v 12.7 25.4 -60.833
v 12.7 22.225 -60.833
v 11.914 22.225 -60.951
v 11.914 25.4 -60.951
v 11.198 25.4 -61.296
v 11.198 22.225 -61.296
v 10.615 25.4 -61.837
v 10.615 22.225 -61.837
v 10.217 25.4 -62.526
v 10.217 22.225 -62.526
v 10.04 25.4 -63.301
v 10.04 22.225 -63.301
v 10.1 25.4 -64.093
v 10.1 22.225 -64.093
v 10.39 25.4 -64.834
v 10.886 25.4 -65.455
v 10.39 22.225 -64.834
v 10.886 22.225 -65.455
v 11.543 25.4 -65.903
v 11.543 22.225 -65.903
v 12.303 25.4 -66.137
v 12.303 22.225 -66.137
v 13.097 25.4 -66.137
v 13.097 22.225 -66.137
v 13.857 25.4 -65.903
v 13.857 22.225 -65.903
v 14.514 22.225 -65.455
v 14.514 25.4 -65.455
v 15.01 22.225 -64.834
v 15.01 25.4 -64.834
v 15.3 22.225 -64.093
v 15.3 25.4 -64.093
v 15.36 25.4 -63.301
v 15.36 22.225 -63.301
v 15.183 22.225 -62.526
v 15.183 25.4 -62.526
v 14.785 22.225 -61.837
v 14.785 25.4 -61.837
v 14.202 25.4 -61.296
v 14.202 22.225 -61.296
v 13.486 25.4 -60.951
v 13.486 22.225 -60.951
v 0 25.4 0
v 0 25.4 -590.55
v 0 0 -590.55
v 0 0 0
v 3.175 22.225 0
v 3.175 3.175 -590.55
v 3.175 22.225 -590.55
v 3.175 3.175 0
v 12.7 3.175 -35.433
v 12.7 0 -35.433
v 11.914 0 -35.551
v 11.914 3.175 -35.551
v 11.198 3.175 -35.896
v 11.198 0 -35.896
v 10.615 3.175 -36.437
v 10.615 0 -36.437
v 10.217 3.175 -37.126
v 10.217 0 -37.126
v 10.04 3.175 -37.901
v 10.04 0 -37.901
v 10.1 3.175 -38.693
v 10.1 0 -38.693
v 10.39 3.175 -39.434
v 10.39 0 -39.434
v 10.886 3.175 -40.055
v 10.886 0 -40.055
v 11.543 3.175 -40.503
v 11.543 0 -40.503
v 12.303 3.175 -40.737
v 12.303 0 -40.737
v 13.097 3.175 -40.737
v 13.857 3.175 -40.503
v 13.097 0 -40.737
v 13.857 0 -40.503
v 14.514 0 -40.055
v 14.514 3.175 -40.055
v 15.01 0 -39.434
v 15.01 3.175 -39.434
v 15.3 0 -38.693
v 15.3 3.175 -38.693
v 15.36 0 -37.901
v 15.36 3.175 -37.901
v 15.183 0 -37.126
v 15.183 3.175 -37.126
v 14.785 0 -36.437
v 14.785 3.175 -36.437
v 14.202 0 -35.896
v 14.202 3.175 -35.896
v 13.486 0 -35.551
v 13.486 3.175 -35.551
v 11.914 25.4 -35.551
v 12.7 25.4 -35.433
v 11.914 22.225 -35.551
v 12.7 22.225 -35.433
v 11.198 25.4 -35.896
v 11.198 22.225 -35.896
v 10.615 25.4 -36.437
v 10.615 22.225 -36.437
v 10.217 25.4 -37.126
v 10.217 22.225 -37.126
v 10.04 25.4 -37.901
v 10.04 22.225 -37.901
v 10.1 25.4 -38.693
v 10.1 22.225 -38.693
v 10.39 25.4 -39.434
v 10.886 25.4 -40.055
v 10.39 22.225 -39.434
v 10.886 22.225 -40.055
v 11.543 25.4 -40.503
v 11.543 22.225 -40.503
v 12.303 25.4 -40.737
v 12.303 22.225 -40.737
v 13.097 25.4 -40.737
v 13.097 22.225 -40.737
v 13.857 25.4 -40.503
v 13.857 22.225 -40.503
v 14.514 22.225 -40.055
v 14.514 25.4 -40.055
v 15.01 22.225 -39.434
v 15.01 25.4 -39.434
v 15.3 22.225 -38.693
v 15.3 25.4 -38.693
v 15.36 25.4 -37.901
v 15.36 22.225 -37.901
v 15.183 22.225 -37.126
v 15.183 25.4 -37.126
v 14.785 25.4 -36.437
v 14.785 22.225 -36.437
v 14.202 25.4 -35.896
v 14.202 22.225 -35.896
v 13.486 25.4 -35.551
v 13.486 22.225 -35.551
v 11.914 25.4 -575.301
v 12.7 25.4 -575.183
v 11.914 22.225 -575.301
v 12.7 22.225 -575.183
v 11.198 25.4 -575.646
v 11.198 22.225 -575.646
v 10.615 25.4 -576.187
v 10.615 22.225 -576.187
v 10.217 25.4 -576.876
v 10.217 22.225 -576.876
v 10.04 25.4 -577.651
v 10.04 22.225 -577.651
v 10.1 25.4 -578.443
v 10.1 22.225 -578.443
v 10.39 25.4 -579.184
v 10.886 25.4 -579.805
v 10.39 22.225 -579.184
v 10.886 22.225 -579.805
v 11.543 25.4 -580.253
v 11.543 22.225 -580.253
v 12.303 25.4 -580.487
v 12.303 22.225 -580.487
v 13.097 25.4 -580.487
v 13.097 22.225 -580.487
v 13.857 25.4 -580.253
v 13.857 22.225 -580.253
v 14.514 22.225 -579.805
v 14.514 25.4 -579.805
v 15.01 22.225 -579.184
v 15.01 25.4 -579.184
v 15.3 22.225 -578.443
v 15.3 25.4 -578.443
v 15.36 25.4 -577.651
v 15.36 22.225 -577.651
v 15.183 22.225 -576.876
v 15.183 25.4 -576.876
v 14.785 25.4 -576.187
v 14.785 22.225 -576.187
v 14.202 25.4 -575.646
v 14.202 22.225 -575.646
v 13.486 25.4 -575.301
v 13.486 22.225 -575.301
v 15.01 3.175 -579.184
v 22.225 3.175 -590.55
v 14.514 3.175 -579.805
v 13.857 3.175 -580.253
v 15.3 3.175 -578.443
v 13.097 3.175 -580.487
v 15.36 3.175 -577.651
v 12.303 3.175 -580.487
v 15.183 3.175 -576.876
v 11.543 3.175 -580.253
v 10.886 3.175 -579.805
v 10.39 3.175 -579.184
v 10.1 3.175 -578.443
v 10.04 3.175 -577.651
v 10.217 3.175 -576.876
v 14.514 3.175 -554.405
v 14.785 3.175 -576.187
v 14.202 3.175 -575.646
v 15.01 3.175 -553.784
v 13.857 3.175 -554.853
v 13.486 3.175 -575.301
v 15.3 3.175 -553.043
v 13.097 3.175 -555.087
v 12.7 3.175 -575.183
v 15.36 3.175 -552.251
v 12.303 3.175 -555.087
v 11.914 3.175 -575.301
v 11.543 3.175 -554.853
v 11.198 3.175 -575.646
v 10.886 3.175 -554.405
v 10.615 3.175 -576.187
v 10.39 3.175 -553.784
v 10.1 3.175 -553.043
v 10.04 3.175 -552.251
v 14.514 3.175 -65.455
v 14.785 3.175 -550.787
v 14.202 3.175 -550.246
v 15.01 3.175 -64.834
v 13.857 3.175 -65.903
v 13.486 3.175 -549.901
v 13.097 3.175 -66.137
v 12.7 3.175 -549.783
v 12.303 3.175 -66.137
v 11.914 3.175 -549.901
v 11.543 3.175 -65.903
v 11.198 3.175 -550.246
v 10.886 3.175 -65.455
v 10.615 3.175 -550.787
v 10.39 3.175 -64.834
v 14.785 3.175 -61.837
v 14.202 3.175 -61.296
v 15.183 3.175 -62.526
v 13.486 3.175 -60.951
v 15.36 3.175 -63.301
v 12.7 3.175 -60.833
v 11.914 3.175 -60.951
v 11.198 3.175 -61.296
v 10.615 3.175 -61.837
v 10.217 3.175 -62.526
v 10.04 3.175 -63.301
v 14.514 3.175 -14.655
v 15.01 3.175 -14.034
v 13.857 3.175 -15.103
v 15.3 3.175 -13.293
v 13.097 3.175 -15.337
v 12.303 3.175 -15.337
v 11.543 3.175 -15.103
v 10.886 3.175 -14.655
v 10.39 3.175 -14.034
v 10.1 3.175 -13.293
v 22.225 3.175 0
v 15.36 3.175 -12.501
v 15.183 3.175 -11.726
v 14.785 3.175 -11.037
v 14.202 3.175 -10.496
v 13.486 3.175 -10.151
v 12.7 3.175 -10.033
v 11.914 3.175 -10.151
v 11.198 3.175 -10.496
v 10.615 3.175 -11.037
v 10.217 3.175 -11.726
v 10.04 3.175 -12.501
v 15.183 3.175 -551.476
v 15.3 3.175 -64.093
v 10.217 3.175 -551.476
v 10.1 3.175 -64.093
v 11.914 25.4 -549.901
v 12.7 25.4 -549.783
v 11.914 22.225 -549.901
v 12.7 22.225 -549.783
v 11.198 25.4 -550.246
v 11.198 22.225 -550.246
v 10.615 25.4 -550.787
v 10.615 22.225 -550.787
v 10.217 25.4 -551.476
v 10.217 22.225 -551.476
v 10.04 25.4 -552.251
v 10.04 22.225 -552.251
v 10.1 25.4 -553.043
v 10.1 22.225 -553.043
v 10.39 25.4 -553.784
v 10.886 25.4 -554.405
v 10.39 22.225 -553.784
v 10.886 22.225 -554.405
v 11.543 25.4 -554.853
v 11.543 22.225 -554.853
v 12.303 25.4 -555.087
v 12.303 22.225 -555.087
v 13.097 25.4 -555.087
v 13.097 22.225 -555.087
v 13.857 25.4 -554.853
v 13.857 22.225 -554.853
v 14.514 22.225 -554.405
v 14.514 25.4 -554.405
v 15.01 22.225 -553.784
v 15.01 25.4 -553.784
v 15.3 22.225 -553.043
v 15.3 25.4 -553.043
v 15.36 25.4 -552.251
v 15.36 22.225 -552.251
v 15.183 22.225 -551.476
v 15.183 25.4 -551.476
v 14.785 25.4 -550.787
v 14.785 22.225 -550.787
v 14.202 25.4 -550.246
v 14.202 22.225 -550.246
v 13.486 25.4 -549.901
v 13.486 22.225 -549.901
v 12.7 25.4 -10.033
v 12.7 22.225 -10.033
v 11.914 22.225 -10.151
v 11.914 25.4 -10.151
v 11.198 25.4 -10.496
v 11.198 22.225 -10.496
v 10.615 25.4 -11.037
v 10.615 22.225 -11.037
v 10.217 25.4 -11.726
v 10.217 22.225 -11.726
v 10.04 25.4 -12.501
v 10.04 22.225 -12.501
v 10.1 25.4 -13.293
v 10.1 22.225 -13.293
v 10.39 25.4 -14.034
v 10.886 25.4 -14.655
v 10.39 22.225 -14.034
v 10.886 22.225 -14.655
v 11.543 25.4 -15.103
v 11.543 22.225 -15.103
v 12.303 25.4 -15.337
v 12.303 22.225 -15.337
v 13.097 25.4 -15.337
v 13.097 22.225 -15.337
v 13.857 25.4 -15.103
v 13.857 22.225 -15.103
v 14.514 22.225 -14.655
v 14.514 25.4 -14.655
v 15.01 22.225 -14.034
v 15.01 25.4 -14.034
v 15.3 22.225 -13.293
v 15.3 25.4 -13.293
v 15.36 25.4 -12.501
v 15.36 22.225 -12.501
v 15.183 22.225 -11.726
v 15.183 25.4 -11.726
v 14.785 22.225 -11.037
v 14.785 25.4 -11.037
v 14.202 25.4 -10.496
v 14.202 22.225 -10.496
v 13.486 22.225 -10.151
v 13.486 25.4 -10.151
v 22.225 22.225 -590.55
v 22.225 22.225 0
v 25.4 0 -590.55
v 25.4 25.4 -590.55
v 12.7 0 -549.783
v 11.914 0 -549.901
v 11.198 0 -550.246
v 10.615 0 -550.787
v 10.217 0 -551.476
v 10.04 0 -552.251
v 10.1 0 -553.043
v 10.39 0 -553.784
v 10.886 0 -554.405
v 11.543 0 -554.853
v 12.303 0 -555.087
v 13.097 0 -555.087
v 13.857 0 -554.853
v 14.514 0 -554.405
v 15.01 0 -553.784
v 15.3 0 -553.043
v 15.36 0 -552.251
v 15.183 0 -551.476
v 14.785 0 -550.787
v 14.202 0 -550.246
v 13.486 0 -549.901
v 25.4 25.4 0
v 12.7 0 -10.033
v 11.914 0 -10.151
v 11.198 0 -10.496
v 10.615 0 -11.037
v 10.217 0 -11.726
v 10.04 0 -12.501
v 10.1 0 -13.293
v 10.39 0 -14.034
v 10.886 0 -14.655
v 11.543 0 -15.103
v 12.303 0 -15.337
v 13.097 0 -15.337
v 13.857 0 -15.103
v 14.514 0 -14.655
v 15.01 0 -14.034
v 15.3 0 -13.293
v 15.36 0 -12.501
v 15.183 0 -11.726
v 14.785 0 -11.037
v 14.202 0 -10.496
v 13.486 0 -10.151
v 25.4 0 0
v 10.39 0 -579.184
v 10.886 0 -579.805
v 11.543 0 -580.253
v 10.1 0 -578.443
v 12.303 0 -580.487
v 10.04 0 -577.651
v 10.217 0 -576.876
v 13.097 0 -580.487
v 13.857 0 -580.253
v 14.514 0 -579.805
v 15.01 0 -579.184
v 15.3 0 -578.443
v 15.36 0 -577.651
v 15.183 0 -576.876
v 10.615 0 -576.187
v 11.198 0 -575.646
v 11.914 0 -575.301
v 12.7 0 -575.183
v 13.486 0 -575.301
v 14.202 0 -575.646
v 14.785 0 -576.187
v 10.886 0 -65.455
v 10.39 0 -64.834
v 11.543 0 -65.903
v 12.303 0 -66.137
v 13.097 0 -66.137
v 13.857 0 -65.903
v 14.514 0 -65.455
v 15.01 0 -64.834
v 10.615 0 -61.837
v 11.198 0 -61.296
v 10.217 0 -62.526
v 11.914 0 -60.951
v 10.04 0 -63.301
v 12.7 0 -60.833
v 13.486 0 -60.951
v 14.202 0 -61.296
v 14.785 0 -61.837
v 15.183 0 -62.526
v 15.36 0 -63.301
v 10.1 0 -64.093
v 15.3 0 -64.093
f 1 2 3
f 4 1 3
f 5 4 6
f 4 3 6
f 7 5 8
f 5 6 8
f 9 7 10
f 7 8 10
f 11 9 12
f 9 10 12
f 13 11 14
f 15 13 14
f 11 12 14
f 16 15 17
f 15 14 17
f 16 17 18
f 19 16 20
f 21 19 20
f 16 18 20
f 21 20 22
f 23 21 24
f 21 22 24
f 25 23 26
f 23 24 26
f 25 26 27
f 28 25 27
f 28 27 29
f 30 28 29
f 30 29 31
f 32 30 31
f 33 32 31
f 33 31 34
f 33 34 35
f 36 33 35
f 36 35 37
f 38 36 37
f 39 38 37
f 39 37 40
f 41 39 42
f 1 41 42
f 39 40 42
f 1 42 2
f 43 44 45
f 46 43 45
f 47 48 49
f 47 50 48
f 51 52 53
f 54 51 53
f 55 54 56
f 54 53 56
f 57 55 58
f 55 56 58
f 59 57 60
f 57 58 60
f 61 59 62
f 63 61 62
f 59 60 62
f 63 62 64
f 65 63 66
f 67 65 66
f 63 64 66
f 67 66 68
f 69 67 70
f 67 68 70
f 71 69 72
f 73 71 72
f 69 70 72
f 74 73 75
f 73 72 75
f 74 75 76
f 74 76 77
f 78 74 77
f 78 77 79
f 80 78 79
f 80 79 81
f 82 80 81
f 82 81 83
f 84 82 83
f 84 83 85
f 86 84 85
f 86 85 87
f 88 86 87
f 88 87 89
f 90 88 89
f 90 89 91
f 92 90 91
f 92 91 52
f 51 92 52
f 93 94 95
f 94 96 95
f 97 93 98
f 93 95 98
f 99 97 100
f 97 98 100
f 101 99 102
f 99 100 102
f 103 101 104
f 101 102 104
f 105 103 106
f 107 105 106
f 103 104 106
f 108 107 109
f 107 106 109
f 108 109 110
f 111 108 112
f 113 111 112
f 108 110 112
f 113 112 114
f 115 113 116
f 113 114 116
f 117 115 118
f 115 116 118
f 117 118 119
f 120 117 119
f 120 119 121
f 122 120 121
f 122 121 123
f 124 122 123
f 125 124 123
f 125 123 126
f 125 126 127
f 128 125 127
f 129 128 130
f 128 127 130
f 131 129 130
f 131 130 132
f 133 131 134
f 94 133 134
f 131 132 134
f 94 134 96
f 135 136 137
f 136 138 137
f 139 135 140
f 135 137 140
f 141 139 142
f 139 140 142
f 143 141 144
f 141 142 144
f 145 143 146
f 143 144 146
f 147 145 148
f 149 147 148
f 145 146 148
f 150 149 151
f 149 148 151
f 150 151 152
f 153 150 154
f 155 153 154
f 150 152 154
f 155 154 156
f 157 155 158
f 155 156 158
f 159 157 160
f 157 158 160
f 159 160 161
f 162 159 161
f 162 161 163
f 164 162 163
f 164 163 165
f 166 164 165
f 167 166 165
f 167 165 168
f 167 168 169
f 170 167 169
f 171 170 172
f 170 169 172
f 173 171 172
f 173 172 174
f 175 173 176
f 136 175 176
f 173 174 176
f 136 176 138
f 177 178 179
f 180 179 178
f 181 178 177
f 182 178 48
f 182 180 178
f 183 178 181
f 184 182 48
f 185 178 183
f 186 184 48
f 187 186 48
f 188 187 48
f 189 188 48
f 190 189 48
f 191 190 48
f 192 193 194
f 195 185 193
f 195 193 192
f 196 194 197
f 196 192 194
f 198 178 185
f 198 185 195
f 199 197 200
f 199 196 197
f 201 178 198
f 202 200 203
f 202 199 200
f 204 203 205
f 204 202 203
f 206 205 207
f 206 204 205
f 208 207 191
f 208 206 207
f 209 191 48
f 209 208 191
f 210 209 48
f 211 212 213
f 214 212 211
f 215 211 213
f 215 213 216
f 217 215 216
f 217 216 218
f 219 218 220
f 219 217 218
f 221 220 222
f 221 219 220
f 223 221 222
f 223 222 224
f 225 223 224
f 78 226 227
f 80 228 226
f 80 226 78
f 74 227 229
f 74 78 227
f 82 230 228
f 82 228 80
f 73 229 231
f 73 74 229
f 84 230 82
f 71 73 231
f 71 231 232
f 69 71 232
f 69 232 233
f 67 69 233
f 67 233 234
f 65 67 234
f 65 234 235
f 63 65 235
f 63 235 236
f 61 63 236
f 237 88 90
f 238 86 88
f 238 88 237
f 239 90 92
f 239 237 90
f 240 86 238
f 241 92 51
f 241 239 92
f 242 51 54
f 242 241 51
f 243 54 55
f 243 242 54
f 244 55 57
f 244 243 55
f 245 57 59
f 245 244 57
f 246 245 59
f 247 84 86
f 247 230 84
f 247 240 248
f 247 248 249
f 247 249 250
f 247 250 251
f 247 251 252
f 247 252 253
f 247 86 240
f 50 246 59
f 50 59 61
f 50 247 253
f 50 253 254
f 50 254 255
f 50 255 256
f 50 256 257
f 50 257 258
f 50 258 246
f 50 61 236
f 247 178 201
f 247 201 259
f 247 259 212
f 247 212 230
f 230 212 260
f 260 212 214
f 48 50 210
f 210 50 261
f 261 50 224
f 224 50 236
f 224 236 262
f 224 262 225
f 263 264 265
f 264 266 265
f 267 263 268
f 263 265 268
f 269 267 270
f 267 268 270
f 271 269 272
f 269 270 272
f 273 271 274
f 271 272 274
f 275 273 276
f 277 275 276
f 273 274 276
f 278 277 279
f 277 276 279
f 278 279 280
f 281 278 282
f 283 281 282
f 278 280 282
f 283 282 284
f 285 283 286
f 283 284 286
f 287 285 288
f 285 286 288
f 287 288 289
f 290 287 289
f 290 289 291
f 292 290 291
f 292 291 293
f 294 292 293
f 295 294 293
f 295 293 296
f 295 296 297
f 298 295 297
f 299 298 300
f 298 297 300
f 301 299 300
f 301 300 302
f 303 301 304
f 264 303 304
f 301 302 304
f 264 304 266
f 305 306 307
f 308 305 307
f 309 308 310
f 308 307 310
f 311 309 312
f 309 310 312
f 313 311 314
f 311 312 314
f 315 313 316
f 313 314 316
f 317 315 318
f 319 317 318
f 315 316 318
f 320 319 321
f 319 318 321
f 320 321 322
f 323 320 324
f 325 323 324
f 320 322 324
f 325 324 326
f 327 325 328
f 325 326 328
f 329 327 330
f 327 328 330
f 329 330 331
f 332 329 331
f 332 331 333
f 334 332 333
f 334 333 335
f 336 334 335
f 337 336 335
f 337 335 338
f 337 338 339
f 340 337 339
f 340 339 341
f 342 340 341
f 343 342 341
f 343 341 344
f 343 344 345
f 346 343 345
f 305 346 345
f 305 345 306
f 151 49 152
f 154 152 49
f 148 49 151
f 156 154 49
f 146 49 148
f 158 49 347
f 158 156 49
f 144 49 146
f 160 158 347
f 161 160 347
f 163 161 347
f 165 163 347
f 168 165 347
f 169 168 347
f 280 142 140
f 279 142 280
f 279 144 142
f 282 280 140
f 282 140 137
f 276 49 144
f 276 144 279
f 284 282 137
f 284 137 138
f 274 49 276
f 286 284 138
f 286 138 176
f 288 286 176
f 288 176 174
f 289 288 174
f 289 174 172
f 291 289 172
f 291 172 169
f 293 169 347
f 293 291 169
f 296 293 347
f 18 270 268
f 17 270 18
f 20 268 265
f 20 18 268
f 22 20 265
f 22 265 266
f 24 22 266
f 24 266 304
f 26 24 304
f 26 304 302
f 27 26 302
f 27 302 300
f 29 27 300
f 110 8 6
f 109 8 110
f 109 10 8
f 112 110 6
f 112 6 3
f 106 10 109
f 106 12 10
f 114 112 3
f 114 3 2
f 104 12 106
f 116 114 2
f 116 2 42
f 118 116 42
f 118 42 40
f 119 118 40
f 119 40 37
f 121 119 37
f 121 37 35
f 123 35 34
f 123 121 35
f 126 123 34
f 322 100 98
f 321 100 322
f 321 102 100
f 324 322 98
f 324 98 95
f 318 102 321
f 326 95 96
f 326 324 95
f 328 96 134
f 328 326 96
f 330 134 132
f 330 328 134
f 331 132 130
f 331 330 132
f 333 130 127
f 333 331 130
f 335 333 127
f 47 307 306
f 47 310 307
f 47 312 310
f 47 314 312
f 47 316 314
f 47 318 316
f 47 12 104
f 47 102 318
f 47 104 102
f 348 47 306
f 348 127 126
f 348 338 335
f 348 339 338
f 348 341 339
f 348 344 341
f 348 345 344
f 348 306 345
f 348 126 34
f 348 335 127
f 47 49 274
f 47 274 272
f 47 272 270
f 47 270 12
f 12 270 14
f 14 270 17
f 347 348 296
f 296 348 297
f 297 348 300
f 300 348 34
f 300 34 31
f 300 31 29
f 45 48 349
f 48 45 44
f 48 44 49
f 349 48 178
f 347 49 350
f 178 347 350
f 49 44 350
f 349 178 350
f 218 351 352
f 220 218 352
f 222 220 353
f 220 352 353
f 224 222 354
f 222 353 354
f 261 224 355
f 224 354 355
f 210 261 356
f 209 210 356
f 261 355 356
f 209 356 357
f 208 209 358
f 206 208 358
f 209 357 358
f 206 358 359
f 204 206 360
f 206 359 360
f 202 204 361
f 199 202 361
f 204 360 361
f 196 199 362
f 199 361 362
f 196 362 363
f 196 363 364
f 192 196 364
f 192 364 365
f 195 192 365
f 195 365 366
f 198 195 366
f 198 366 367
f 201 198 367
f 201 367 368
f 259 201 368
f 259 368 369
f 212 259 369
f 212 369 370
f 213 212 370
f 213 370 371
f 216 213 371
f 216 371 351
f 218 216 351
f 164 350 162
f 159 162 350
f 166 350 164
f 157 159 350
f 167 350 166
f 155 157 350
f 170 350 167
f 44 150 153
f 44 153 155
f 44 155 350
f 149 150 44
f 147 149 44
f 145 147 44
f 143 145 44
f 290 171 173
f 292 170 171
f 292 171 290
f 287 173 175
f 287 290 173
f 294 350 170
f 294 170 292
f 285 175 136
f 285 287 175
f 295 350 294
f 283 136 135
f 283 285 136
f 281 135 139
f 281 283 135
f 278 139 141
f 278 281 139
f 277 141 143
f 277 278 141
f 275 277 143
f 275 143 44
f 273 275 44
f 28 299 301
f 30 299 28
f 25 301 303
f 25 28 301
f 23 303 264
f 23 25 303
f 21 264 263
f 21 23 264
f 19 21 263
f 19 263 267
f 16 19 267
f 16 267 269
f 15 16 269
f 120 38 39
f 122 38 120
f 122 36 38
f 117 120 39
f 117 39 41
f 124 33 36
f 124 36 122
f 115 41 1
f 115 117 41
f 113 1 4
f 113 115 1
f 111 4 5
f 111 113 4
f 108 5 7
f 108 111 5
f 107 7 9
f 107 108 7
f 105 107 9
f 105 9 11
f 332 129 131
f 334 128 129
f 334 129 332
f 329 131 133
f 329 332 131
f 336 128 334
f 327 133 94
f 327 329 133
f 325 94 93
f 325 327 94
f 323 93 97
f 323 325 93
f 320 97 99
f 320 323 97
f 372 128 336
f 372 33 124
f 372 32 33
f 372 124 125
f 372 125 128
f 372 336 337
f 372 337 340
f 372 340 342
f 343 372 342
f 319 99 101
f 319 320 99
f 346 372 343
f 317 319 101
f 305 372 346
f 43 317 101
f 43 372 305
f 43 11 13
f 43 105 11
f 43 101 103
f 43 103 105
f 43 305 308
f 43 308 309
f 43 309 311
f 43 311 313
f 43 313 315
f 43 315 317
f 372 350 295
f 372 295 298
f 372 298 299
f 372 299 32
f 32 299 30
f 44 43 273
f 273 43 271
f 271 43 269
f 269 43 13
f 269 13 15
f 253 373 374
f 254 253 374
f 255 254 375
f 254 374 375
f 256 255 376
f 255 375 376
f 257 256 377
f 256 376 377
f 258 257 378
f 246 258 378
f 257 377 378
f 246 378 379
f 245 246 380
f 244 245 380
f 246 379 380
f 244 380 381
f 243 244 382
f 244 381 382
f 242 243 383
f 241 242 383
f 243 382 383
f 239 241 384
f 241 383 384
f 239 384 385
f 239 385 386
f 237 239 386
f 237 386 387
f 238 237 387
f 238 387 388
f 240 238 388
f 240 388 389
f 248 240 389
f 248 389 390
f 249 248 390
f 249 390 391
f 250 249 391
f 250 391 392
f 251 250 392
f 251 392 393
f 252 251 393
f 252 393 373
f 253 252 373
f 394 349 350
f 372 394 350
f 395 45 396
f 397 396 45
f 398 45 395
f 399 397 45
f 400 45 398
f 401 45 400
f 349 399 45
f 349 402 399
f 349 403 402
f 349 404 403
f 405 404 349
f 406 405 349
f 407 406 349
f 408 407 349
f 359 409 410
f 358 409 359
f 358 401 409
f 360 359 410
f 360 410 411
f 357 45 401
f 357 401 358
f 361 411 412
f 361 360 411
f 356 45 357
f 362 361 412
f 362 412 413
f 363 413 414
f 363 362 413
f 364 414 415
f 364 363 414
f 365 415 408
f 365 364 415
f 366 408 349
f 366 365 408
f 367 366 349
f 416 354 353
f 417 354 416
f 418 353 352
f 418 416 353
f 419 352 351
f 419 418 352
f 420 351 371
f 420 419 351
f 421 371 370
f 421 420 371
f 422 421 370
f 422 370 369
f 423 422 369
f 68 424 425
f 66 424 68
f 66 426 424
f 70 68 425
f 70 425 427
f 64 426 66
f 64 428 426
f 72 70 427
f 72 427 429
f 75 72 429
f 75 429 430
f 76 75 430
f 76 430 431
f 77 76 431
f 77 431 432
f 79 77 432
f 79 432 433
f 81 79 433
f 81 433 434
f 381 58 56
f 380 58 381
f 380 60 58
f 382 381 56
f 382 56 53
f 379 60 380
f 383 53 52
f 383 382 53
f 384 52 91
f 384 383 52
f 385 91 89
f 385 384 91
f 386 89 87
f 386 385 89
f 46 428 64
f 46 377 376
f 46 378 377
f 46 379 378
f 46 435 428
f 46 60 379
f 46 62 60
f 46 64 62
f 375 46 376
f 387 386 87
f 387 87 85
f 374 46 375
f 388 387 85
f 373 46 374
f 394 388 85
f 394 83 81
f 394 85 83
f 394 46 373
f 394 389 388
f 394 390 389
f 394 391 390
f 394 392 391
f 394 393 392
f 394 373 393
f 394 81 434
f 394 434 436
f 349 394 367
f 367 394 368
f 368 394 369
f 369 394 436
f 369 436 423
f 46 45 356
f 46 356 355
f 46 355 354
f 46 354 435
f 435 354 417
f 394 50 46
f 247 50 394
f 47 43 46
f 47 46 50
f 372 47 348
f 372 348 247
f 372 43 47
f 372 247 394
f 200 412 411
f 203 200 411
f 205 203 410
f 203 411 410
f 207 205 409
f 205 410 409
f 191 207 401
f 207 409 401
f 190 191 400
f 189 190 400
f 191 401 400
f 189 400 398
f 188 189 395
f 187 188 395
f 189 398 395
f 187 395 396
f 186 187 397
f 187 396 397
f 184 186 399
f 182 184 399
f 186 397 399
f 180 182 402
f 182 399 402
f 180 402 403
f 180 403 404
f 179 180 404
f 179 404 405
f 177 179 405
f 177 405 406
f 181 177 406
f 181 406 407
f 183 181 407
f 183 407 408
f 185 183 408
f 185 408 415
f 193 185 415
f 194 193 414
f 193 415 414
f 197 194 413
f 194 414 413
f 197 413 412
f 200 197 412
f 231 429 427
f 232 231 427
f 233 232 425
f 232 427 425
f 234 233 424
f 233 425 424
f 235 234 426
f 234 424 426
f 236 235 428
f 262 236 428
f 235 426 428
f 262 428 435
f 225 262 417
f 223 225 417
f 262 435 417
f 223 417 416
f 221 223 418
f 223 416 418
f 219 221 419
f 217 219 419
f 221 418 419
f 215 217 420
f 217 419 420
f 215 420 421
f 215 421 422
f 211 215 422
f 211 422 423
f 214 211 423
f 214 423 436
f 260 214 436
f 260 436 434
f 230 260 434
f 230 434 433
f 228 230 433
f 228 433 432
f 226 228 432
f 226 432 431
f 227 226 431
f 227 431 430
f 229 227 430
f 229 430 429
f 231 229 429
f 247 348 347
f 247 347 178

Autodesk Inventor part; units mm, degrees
ref_plane "YZ Plane" through (0, 0, 0) normal (1, 0, 0) x (0, 1, 0)
ref_plane "XZ Plane" through (0, 0, 0) normal (0, 1, 0) x (-1, 0, 0)
ref_plane "XY Plane" through (0, 0, 0) normal (0, 0, 1) x (1, 0, 0)
sketch "Sketch1" plane through (0, 0, 0) normal (0, 0, 1) x (1, 0, 0)
  line L0 (0, 0) -> (25.4, 0)
  line L1 (25.4, 0) -> (25.4, 25.4)
  line L2 (25.4, 25.4) -> (0, 25.4)
  line L3 (0, 25.4) -> (0, 0)
  line L4 (3.175, 22.225) -> (22.225, 22.225)
  line L5 (22.225, 22.225) -> (22.225, 3.175)
  line L6 (22.225, 3.175) -> (3.175, 3.175)
  line L7 (3.175, 3.175) -> (3.175, 22.225)
  dimension "d0" = 25.4
  dimension "d1" = 25.4
  dimension "d2" = 3.175
extrude "Extrusion1" add sketch "Sketch1" against normal blind 590.55
sketch "Sketch5" plane through (0, 25.4, 0) normal (0, 1, 0) x (1, 0, 0)
  line L0 (25.4, 590.55) -> (0, 590.55) projected
  line L1 (25.4, 0) -> (0, 0) projected
  point P0 (12.7, 12.7)
  point P1 (12.7, 38.1)
  point P2 (12.7, 63.5)
  point P3 (12.7, 577.85)
  point P4 (12.7, 552.45)
  dimension "d32" = 12.7
  dimension "d33" = 25.4
  dimension "d34" = 12.7
  dimension "d35" = 25.4
  dimension "d36" = 25.4
hole "Hole4" at (12.7, 25.4, -12.7) at (12.7, 25.4, -38.1) at (12.7, 25.4, -63.5) at (12.7, 25.4, -577.85) at (12.7, 25.4, -552.45) direction (0, -1, 0) diameter 5.334 depth 25.4 tip angle 118
properties part number "new horizontal kicker thingleft"
